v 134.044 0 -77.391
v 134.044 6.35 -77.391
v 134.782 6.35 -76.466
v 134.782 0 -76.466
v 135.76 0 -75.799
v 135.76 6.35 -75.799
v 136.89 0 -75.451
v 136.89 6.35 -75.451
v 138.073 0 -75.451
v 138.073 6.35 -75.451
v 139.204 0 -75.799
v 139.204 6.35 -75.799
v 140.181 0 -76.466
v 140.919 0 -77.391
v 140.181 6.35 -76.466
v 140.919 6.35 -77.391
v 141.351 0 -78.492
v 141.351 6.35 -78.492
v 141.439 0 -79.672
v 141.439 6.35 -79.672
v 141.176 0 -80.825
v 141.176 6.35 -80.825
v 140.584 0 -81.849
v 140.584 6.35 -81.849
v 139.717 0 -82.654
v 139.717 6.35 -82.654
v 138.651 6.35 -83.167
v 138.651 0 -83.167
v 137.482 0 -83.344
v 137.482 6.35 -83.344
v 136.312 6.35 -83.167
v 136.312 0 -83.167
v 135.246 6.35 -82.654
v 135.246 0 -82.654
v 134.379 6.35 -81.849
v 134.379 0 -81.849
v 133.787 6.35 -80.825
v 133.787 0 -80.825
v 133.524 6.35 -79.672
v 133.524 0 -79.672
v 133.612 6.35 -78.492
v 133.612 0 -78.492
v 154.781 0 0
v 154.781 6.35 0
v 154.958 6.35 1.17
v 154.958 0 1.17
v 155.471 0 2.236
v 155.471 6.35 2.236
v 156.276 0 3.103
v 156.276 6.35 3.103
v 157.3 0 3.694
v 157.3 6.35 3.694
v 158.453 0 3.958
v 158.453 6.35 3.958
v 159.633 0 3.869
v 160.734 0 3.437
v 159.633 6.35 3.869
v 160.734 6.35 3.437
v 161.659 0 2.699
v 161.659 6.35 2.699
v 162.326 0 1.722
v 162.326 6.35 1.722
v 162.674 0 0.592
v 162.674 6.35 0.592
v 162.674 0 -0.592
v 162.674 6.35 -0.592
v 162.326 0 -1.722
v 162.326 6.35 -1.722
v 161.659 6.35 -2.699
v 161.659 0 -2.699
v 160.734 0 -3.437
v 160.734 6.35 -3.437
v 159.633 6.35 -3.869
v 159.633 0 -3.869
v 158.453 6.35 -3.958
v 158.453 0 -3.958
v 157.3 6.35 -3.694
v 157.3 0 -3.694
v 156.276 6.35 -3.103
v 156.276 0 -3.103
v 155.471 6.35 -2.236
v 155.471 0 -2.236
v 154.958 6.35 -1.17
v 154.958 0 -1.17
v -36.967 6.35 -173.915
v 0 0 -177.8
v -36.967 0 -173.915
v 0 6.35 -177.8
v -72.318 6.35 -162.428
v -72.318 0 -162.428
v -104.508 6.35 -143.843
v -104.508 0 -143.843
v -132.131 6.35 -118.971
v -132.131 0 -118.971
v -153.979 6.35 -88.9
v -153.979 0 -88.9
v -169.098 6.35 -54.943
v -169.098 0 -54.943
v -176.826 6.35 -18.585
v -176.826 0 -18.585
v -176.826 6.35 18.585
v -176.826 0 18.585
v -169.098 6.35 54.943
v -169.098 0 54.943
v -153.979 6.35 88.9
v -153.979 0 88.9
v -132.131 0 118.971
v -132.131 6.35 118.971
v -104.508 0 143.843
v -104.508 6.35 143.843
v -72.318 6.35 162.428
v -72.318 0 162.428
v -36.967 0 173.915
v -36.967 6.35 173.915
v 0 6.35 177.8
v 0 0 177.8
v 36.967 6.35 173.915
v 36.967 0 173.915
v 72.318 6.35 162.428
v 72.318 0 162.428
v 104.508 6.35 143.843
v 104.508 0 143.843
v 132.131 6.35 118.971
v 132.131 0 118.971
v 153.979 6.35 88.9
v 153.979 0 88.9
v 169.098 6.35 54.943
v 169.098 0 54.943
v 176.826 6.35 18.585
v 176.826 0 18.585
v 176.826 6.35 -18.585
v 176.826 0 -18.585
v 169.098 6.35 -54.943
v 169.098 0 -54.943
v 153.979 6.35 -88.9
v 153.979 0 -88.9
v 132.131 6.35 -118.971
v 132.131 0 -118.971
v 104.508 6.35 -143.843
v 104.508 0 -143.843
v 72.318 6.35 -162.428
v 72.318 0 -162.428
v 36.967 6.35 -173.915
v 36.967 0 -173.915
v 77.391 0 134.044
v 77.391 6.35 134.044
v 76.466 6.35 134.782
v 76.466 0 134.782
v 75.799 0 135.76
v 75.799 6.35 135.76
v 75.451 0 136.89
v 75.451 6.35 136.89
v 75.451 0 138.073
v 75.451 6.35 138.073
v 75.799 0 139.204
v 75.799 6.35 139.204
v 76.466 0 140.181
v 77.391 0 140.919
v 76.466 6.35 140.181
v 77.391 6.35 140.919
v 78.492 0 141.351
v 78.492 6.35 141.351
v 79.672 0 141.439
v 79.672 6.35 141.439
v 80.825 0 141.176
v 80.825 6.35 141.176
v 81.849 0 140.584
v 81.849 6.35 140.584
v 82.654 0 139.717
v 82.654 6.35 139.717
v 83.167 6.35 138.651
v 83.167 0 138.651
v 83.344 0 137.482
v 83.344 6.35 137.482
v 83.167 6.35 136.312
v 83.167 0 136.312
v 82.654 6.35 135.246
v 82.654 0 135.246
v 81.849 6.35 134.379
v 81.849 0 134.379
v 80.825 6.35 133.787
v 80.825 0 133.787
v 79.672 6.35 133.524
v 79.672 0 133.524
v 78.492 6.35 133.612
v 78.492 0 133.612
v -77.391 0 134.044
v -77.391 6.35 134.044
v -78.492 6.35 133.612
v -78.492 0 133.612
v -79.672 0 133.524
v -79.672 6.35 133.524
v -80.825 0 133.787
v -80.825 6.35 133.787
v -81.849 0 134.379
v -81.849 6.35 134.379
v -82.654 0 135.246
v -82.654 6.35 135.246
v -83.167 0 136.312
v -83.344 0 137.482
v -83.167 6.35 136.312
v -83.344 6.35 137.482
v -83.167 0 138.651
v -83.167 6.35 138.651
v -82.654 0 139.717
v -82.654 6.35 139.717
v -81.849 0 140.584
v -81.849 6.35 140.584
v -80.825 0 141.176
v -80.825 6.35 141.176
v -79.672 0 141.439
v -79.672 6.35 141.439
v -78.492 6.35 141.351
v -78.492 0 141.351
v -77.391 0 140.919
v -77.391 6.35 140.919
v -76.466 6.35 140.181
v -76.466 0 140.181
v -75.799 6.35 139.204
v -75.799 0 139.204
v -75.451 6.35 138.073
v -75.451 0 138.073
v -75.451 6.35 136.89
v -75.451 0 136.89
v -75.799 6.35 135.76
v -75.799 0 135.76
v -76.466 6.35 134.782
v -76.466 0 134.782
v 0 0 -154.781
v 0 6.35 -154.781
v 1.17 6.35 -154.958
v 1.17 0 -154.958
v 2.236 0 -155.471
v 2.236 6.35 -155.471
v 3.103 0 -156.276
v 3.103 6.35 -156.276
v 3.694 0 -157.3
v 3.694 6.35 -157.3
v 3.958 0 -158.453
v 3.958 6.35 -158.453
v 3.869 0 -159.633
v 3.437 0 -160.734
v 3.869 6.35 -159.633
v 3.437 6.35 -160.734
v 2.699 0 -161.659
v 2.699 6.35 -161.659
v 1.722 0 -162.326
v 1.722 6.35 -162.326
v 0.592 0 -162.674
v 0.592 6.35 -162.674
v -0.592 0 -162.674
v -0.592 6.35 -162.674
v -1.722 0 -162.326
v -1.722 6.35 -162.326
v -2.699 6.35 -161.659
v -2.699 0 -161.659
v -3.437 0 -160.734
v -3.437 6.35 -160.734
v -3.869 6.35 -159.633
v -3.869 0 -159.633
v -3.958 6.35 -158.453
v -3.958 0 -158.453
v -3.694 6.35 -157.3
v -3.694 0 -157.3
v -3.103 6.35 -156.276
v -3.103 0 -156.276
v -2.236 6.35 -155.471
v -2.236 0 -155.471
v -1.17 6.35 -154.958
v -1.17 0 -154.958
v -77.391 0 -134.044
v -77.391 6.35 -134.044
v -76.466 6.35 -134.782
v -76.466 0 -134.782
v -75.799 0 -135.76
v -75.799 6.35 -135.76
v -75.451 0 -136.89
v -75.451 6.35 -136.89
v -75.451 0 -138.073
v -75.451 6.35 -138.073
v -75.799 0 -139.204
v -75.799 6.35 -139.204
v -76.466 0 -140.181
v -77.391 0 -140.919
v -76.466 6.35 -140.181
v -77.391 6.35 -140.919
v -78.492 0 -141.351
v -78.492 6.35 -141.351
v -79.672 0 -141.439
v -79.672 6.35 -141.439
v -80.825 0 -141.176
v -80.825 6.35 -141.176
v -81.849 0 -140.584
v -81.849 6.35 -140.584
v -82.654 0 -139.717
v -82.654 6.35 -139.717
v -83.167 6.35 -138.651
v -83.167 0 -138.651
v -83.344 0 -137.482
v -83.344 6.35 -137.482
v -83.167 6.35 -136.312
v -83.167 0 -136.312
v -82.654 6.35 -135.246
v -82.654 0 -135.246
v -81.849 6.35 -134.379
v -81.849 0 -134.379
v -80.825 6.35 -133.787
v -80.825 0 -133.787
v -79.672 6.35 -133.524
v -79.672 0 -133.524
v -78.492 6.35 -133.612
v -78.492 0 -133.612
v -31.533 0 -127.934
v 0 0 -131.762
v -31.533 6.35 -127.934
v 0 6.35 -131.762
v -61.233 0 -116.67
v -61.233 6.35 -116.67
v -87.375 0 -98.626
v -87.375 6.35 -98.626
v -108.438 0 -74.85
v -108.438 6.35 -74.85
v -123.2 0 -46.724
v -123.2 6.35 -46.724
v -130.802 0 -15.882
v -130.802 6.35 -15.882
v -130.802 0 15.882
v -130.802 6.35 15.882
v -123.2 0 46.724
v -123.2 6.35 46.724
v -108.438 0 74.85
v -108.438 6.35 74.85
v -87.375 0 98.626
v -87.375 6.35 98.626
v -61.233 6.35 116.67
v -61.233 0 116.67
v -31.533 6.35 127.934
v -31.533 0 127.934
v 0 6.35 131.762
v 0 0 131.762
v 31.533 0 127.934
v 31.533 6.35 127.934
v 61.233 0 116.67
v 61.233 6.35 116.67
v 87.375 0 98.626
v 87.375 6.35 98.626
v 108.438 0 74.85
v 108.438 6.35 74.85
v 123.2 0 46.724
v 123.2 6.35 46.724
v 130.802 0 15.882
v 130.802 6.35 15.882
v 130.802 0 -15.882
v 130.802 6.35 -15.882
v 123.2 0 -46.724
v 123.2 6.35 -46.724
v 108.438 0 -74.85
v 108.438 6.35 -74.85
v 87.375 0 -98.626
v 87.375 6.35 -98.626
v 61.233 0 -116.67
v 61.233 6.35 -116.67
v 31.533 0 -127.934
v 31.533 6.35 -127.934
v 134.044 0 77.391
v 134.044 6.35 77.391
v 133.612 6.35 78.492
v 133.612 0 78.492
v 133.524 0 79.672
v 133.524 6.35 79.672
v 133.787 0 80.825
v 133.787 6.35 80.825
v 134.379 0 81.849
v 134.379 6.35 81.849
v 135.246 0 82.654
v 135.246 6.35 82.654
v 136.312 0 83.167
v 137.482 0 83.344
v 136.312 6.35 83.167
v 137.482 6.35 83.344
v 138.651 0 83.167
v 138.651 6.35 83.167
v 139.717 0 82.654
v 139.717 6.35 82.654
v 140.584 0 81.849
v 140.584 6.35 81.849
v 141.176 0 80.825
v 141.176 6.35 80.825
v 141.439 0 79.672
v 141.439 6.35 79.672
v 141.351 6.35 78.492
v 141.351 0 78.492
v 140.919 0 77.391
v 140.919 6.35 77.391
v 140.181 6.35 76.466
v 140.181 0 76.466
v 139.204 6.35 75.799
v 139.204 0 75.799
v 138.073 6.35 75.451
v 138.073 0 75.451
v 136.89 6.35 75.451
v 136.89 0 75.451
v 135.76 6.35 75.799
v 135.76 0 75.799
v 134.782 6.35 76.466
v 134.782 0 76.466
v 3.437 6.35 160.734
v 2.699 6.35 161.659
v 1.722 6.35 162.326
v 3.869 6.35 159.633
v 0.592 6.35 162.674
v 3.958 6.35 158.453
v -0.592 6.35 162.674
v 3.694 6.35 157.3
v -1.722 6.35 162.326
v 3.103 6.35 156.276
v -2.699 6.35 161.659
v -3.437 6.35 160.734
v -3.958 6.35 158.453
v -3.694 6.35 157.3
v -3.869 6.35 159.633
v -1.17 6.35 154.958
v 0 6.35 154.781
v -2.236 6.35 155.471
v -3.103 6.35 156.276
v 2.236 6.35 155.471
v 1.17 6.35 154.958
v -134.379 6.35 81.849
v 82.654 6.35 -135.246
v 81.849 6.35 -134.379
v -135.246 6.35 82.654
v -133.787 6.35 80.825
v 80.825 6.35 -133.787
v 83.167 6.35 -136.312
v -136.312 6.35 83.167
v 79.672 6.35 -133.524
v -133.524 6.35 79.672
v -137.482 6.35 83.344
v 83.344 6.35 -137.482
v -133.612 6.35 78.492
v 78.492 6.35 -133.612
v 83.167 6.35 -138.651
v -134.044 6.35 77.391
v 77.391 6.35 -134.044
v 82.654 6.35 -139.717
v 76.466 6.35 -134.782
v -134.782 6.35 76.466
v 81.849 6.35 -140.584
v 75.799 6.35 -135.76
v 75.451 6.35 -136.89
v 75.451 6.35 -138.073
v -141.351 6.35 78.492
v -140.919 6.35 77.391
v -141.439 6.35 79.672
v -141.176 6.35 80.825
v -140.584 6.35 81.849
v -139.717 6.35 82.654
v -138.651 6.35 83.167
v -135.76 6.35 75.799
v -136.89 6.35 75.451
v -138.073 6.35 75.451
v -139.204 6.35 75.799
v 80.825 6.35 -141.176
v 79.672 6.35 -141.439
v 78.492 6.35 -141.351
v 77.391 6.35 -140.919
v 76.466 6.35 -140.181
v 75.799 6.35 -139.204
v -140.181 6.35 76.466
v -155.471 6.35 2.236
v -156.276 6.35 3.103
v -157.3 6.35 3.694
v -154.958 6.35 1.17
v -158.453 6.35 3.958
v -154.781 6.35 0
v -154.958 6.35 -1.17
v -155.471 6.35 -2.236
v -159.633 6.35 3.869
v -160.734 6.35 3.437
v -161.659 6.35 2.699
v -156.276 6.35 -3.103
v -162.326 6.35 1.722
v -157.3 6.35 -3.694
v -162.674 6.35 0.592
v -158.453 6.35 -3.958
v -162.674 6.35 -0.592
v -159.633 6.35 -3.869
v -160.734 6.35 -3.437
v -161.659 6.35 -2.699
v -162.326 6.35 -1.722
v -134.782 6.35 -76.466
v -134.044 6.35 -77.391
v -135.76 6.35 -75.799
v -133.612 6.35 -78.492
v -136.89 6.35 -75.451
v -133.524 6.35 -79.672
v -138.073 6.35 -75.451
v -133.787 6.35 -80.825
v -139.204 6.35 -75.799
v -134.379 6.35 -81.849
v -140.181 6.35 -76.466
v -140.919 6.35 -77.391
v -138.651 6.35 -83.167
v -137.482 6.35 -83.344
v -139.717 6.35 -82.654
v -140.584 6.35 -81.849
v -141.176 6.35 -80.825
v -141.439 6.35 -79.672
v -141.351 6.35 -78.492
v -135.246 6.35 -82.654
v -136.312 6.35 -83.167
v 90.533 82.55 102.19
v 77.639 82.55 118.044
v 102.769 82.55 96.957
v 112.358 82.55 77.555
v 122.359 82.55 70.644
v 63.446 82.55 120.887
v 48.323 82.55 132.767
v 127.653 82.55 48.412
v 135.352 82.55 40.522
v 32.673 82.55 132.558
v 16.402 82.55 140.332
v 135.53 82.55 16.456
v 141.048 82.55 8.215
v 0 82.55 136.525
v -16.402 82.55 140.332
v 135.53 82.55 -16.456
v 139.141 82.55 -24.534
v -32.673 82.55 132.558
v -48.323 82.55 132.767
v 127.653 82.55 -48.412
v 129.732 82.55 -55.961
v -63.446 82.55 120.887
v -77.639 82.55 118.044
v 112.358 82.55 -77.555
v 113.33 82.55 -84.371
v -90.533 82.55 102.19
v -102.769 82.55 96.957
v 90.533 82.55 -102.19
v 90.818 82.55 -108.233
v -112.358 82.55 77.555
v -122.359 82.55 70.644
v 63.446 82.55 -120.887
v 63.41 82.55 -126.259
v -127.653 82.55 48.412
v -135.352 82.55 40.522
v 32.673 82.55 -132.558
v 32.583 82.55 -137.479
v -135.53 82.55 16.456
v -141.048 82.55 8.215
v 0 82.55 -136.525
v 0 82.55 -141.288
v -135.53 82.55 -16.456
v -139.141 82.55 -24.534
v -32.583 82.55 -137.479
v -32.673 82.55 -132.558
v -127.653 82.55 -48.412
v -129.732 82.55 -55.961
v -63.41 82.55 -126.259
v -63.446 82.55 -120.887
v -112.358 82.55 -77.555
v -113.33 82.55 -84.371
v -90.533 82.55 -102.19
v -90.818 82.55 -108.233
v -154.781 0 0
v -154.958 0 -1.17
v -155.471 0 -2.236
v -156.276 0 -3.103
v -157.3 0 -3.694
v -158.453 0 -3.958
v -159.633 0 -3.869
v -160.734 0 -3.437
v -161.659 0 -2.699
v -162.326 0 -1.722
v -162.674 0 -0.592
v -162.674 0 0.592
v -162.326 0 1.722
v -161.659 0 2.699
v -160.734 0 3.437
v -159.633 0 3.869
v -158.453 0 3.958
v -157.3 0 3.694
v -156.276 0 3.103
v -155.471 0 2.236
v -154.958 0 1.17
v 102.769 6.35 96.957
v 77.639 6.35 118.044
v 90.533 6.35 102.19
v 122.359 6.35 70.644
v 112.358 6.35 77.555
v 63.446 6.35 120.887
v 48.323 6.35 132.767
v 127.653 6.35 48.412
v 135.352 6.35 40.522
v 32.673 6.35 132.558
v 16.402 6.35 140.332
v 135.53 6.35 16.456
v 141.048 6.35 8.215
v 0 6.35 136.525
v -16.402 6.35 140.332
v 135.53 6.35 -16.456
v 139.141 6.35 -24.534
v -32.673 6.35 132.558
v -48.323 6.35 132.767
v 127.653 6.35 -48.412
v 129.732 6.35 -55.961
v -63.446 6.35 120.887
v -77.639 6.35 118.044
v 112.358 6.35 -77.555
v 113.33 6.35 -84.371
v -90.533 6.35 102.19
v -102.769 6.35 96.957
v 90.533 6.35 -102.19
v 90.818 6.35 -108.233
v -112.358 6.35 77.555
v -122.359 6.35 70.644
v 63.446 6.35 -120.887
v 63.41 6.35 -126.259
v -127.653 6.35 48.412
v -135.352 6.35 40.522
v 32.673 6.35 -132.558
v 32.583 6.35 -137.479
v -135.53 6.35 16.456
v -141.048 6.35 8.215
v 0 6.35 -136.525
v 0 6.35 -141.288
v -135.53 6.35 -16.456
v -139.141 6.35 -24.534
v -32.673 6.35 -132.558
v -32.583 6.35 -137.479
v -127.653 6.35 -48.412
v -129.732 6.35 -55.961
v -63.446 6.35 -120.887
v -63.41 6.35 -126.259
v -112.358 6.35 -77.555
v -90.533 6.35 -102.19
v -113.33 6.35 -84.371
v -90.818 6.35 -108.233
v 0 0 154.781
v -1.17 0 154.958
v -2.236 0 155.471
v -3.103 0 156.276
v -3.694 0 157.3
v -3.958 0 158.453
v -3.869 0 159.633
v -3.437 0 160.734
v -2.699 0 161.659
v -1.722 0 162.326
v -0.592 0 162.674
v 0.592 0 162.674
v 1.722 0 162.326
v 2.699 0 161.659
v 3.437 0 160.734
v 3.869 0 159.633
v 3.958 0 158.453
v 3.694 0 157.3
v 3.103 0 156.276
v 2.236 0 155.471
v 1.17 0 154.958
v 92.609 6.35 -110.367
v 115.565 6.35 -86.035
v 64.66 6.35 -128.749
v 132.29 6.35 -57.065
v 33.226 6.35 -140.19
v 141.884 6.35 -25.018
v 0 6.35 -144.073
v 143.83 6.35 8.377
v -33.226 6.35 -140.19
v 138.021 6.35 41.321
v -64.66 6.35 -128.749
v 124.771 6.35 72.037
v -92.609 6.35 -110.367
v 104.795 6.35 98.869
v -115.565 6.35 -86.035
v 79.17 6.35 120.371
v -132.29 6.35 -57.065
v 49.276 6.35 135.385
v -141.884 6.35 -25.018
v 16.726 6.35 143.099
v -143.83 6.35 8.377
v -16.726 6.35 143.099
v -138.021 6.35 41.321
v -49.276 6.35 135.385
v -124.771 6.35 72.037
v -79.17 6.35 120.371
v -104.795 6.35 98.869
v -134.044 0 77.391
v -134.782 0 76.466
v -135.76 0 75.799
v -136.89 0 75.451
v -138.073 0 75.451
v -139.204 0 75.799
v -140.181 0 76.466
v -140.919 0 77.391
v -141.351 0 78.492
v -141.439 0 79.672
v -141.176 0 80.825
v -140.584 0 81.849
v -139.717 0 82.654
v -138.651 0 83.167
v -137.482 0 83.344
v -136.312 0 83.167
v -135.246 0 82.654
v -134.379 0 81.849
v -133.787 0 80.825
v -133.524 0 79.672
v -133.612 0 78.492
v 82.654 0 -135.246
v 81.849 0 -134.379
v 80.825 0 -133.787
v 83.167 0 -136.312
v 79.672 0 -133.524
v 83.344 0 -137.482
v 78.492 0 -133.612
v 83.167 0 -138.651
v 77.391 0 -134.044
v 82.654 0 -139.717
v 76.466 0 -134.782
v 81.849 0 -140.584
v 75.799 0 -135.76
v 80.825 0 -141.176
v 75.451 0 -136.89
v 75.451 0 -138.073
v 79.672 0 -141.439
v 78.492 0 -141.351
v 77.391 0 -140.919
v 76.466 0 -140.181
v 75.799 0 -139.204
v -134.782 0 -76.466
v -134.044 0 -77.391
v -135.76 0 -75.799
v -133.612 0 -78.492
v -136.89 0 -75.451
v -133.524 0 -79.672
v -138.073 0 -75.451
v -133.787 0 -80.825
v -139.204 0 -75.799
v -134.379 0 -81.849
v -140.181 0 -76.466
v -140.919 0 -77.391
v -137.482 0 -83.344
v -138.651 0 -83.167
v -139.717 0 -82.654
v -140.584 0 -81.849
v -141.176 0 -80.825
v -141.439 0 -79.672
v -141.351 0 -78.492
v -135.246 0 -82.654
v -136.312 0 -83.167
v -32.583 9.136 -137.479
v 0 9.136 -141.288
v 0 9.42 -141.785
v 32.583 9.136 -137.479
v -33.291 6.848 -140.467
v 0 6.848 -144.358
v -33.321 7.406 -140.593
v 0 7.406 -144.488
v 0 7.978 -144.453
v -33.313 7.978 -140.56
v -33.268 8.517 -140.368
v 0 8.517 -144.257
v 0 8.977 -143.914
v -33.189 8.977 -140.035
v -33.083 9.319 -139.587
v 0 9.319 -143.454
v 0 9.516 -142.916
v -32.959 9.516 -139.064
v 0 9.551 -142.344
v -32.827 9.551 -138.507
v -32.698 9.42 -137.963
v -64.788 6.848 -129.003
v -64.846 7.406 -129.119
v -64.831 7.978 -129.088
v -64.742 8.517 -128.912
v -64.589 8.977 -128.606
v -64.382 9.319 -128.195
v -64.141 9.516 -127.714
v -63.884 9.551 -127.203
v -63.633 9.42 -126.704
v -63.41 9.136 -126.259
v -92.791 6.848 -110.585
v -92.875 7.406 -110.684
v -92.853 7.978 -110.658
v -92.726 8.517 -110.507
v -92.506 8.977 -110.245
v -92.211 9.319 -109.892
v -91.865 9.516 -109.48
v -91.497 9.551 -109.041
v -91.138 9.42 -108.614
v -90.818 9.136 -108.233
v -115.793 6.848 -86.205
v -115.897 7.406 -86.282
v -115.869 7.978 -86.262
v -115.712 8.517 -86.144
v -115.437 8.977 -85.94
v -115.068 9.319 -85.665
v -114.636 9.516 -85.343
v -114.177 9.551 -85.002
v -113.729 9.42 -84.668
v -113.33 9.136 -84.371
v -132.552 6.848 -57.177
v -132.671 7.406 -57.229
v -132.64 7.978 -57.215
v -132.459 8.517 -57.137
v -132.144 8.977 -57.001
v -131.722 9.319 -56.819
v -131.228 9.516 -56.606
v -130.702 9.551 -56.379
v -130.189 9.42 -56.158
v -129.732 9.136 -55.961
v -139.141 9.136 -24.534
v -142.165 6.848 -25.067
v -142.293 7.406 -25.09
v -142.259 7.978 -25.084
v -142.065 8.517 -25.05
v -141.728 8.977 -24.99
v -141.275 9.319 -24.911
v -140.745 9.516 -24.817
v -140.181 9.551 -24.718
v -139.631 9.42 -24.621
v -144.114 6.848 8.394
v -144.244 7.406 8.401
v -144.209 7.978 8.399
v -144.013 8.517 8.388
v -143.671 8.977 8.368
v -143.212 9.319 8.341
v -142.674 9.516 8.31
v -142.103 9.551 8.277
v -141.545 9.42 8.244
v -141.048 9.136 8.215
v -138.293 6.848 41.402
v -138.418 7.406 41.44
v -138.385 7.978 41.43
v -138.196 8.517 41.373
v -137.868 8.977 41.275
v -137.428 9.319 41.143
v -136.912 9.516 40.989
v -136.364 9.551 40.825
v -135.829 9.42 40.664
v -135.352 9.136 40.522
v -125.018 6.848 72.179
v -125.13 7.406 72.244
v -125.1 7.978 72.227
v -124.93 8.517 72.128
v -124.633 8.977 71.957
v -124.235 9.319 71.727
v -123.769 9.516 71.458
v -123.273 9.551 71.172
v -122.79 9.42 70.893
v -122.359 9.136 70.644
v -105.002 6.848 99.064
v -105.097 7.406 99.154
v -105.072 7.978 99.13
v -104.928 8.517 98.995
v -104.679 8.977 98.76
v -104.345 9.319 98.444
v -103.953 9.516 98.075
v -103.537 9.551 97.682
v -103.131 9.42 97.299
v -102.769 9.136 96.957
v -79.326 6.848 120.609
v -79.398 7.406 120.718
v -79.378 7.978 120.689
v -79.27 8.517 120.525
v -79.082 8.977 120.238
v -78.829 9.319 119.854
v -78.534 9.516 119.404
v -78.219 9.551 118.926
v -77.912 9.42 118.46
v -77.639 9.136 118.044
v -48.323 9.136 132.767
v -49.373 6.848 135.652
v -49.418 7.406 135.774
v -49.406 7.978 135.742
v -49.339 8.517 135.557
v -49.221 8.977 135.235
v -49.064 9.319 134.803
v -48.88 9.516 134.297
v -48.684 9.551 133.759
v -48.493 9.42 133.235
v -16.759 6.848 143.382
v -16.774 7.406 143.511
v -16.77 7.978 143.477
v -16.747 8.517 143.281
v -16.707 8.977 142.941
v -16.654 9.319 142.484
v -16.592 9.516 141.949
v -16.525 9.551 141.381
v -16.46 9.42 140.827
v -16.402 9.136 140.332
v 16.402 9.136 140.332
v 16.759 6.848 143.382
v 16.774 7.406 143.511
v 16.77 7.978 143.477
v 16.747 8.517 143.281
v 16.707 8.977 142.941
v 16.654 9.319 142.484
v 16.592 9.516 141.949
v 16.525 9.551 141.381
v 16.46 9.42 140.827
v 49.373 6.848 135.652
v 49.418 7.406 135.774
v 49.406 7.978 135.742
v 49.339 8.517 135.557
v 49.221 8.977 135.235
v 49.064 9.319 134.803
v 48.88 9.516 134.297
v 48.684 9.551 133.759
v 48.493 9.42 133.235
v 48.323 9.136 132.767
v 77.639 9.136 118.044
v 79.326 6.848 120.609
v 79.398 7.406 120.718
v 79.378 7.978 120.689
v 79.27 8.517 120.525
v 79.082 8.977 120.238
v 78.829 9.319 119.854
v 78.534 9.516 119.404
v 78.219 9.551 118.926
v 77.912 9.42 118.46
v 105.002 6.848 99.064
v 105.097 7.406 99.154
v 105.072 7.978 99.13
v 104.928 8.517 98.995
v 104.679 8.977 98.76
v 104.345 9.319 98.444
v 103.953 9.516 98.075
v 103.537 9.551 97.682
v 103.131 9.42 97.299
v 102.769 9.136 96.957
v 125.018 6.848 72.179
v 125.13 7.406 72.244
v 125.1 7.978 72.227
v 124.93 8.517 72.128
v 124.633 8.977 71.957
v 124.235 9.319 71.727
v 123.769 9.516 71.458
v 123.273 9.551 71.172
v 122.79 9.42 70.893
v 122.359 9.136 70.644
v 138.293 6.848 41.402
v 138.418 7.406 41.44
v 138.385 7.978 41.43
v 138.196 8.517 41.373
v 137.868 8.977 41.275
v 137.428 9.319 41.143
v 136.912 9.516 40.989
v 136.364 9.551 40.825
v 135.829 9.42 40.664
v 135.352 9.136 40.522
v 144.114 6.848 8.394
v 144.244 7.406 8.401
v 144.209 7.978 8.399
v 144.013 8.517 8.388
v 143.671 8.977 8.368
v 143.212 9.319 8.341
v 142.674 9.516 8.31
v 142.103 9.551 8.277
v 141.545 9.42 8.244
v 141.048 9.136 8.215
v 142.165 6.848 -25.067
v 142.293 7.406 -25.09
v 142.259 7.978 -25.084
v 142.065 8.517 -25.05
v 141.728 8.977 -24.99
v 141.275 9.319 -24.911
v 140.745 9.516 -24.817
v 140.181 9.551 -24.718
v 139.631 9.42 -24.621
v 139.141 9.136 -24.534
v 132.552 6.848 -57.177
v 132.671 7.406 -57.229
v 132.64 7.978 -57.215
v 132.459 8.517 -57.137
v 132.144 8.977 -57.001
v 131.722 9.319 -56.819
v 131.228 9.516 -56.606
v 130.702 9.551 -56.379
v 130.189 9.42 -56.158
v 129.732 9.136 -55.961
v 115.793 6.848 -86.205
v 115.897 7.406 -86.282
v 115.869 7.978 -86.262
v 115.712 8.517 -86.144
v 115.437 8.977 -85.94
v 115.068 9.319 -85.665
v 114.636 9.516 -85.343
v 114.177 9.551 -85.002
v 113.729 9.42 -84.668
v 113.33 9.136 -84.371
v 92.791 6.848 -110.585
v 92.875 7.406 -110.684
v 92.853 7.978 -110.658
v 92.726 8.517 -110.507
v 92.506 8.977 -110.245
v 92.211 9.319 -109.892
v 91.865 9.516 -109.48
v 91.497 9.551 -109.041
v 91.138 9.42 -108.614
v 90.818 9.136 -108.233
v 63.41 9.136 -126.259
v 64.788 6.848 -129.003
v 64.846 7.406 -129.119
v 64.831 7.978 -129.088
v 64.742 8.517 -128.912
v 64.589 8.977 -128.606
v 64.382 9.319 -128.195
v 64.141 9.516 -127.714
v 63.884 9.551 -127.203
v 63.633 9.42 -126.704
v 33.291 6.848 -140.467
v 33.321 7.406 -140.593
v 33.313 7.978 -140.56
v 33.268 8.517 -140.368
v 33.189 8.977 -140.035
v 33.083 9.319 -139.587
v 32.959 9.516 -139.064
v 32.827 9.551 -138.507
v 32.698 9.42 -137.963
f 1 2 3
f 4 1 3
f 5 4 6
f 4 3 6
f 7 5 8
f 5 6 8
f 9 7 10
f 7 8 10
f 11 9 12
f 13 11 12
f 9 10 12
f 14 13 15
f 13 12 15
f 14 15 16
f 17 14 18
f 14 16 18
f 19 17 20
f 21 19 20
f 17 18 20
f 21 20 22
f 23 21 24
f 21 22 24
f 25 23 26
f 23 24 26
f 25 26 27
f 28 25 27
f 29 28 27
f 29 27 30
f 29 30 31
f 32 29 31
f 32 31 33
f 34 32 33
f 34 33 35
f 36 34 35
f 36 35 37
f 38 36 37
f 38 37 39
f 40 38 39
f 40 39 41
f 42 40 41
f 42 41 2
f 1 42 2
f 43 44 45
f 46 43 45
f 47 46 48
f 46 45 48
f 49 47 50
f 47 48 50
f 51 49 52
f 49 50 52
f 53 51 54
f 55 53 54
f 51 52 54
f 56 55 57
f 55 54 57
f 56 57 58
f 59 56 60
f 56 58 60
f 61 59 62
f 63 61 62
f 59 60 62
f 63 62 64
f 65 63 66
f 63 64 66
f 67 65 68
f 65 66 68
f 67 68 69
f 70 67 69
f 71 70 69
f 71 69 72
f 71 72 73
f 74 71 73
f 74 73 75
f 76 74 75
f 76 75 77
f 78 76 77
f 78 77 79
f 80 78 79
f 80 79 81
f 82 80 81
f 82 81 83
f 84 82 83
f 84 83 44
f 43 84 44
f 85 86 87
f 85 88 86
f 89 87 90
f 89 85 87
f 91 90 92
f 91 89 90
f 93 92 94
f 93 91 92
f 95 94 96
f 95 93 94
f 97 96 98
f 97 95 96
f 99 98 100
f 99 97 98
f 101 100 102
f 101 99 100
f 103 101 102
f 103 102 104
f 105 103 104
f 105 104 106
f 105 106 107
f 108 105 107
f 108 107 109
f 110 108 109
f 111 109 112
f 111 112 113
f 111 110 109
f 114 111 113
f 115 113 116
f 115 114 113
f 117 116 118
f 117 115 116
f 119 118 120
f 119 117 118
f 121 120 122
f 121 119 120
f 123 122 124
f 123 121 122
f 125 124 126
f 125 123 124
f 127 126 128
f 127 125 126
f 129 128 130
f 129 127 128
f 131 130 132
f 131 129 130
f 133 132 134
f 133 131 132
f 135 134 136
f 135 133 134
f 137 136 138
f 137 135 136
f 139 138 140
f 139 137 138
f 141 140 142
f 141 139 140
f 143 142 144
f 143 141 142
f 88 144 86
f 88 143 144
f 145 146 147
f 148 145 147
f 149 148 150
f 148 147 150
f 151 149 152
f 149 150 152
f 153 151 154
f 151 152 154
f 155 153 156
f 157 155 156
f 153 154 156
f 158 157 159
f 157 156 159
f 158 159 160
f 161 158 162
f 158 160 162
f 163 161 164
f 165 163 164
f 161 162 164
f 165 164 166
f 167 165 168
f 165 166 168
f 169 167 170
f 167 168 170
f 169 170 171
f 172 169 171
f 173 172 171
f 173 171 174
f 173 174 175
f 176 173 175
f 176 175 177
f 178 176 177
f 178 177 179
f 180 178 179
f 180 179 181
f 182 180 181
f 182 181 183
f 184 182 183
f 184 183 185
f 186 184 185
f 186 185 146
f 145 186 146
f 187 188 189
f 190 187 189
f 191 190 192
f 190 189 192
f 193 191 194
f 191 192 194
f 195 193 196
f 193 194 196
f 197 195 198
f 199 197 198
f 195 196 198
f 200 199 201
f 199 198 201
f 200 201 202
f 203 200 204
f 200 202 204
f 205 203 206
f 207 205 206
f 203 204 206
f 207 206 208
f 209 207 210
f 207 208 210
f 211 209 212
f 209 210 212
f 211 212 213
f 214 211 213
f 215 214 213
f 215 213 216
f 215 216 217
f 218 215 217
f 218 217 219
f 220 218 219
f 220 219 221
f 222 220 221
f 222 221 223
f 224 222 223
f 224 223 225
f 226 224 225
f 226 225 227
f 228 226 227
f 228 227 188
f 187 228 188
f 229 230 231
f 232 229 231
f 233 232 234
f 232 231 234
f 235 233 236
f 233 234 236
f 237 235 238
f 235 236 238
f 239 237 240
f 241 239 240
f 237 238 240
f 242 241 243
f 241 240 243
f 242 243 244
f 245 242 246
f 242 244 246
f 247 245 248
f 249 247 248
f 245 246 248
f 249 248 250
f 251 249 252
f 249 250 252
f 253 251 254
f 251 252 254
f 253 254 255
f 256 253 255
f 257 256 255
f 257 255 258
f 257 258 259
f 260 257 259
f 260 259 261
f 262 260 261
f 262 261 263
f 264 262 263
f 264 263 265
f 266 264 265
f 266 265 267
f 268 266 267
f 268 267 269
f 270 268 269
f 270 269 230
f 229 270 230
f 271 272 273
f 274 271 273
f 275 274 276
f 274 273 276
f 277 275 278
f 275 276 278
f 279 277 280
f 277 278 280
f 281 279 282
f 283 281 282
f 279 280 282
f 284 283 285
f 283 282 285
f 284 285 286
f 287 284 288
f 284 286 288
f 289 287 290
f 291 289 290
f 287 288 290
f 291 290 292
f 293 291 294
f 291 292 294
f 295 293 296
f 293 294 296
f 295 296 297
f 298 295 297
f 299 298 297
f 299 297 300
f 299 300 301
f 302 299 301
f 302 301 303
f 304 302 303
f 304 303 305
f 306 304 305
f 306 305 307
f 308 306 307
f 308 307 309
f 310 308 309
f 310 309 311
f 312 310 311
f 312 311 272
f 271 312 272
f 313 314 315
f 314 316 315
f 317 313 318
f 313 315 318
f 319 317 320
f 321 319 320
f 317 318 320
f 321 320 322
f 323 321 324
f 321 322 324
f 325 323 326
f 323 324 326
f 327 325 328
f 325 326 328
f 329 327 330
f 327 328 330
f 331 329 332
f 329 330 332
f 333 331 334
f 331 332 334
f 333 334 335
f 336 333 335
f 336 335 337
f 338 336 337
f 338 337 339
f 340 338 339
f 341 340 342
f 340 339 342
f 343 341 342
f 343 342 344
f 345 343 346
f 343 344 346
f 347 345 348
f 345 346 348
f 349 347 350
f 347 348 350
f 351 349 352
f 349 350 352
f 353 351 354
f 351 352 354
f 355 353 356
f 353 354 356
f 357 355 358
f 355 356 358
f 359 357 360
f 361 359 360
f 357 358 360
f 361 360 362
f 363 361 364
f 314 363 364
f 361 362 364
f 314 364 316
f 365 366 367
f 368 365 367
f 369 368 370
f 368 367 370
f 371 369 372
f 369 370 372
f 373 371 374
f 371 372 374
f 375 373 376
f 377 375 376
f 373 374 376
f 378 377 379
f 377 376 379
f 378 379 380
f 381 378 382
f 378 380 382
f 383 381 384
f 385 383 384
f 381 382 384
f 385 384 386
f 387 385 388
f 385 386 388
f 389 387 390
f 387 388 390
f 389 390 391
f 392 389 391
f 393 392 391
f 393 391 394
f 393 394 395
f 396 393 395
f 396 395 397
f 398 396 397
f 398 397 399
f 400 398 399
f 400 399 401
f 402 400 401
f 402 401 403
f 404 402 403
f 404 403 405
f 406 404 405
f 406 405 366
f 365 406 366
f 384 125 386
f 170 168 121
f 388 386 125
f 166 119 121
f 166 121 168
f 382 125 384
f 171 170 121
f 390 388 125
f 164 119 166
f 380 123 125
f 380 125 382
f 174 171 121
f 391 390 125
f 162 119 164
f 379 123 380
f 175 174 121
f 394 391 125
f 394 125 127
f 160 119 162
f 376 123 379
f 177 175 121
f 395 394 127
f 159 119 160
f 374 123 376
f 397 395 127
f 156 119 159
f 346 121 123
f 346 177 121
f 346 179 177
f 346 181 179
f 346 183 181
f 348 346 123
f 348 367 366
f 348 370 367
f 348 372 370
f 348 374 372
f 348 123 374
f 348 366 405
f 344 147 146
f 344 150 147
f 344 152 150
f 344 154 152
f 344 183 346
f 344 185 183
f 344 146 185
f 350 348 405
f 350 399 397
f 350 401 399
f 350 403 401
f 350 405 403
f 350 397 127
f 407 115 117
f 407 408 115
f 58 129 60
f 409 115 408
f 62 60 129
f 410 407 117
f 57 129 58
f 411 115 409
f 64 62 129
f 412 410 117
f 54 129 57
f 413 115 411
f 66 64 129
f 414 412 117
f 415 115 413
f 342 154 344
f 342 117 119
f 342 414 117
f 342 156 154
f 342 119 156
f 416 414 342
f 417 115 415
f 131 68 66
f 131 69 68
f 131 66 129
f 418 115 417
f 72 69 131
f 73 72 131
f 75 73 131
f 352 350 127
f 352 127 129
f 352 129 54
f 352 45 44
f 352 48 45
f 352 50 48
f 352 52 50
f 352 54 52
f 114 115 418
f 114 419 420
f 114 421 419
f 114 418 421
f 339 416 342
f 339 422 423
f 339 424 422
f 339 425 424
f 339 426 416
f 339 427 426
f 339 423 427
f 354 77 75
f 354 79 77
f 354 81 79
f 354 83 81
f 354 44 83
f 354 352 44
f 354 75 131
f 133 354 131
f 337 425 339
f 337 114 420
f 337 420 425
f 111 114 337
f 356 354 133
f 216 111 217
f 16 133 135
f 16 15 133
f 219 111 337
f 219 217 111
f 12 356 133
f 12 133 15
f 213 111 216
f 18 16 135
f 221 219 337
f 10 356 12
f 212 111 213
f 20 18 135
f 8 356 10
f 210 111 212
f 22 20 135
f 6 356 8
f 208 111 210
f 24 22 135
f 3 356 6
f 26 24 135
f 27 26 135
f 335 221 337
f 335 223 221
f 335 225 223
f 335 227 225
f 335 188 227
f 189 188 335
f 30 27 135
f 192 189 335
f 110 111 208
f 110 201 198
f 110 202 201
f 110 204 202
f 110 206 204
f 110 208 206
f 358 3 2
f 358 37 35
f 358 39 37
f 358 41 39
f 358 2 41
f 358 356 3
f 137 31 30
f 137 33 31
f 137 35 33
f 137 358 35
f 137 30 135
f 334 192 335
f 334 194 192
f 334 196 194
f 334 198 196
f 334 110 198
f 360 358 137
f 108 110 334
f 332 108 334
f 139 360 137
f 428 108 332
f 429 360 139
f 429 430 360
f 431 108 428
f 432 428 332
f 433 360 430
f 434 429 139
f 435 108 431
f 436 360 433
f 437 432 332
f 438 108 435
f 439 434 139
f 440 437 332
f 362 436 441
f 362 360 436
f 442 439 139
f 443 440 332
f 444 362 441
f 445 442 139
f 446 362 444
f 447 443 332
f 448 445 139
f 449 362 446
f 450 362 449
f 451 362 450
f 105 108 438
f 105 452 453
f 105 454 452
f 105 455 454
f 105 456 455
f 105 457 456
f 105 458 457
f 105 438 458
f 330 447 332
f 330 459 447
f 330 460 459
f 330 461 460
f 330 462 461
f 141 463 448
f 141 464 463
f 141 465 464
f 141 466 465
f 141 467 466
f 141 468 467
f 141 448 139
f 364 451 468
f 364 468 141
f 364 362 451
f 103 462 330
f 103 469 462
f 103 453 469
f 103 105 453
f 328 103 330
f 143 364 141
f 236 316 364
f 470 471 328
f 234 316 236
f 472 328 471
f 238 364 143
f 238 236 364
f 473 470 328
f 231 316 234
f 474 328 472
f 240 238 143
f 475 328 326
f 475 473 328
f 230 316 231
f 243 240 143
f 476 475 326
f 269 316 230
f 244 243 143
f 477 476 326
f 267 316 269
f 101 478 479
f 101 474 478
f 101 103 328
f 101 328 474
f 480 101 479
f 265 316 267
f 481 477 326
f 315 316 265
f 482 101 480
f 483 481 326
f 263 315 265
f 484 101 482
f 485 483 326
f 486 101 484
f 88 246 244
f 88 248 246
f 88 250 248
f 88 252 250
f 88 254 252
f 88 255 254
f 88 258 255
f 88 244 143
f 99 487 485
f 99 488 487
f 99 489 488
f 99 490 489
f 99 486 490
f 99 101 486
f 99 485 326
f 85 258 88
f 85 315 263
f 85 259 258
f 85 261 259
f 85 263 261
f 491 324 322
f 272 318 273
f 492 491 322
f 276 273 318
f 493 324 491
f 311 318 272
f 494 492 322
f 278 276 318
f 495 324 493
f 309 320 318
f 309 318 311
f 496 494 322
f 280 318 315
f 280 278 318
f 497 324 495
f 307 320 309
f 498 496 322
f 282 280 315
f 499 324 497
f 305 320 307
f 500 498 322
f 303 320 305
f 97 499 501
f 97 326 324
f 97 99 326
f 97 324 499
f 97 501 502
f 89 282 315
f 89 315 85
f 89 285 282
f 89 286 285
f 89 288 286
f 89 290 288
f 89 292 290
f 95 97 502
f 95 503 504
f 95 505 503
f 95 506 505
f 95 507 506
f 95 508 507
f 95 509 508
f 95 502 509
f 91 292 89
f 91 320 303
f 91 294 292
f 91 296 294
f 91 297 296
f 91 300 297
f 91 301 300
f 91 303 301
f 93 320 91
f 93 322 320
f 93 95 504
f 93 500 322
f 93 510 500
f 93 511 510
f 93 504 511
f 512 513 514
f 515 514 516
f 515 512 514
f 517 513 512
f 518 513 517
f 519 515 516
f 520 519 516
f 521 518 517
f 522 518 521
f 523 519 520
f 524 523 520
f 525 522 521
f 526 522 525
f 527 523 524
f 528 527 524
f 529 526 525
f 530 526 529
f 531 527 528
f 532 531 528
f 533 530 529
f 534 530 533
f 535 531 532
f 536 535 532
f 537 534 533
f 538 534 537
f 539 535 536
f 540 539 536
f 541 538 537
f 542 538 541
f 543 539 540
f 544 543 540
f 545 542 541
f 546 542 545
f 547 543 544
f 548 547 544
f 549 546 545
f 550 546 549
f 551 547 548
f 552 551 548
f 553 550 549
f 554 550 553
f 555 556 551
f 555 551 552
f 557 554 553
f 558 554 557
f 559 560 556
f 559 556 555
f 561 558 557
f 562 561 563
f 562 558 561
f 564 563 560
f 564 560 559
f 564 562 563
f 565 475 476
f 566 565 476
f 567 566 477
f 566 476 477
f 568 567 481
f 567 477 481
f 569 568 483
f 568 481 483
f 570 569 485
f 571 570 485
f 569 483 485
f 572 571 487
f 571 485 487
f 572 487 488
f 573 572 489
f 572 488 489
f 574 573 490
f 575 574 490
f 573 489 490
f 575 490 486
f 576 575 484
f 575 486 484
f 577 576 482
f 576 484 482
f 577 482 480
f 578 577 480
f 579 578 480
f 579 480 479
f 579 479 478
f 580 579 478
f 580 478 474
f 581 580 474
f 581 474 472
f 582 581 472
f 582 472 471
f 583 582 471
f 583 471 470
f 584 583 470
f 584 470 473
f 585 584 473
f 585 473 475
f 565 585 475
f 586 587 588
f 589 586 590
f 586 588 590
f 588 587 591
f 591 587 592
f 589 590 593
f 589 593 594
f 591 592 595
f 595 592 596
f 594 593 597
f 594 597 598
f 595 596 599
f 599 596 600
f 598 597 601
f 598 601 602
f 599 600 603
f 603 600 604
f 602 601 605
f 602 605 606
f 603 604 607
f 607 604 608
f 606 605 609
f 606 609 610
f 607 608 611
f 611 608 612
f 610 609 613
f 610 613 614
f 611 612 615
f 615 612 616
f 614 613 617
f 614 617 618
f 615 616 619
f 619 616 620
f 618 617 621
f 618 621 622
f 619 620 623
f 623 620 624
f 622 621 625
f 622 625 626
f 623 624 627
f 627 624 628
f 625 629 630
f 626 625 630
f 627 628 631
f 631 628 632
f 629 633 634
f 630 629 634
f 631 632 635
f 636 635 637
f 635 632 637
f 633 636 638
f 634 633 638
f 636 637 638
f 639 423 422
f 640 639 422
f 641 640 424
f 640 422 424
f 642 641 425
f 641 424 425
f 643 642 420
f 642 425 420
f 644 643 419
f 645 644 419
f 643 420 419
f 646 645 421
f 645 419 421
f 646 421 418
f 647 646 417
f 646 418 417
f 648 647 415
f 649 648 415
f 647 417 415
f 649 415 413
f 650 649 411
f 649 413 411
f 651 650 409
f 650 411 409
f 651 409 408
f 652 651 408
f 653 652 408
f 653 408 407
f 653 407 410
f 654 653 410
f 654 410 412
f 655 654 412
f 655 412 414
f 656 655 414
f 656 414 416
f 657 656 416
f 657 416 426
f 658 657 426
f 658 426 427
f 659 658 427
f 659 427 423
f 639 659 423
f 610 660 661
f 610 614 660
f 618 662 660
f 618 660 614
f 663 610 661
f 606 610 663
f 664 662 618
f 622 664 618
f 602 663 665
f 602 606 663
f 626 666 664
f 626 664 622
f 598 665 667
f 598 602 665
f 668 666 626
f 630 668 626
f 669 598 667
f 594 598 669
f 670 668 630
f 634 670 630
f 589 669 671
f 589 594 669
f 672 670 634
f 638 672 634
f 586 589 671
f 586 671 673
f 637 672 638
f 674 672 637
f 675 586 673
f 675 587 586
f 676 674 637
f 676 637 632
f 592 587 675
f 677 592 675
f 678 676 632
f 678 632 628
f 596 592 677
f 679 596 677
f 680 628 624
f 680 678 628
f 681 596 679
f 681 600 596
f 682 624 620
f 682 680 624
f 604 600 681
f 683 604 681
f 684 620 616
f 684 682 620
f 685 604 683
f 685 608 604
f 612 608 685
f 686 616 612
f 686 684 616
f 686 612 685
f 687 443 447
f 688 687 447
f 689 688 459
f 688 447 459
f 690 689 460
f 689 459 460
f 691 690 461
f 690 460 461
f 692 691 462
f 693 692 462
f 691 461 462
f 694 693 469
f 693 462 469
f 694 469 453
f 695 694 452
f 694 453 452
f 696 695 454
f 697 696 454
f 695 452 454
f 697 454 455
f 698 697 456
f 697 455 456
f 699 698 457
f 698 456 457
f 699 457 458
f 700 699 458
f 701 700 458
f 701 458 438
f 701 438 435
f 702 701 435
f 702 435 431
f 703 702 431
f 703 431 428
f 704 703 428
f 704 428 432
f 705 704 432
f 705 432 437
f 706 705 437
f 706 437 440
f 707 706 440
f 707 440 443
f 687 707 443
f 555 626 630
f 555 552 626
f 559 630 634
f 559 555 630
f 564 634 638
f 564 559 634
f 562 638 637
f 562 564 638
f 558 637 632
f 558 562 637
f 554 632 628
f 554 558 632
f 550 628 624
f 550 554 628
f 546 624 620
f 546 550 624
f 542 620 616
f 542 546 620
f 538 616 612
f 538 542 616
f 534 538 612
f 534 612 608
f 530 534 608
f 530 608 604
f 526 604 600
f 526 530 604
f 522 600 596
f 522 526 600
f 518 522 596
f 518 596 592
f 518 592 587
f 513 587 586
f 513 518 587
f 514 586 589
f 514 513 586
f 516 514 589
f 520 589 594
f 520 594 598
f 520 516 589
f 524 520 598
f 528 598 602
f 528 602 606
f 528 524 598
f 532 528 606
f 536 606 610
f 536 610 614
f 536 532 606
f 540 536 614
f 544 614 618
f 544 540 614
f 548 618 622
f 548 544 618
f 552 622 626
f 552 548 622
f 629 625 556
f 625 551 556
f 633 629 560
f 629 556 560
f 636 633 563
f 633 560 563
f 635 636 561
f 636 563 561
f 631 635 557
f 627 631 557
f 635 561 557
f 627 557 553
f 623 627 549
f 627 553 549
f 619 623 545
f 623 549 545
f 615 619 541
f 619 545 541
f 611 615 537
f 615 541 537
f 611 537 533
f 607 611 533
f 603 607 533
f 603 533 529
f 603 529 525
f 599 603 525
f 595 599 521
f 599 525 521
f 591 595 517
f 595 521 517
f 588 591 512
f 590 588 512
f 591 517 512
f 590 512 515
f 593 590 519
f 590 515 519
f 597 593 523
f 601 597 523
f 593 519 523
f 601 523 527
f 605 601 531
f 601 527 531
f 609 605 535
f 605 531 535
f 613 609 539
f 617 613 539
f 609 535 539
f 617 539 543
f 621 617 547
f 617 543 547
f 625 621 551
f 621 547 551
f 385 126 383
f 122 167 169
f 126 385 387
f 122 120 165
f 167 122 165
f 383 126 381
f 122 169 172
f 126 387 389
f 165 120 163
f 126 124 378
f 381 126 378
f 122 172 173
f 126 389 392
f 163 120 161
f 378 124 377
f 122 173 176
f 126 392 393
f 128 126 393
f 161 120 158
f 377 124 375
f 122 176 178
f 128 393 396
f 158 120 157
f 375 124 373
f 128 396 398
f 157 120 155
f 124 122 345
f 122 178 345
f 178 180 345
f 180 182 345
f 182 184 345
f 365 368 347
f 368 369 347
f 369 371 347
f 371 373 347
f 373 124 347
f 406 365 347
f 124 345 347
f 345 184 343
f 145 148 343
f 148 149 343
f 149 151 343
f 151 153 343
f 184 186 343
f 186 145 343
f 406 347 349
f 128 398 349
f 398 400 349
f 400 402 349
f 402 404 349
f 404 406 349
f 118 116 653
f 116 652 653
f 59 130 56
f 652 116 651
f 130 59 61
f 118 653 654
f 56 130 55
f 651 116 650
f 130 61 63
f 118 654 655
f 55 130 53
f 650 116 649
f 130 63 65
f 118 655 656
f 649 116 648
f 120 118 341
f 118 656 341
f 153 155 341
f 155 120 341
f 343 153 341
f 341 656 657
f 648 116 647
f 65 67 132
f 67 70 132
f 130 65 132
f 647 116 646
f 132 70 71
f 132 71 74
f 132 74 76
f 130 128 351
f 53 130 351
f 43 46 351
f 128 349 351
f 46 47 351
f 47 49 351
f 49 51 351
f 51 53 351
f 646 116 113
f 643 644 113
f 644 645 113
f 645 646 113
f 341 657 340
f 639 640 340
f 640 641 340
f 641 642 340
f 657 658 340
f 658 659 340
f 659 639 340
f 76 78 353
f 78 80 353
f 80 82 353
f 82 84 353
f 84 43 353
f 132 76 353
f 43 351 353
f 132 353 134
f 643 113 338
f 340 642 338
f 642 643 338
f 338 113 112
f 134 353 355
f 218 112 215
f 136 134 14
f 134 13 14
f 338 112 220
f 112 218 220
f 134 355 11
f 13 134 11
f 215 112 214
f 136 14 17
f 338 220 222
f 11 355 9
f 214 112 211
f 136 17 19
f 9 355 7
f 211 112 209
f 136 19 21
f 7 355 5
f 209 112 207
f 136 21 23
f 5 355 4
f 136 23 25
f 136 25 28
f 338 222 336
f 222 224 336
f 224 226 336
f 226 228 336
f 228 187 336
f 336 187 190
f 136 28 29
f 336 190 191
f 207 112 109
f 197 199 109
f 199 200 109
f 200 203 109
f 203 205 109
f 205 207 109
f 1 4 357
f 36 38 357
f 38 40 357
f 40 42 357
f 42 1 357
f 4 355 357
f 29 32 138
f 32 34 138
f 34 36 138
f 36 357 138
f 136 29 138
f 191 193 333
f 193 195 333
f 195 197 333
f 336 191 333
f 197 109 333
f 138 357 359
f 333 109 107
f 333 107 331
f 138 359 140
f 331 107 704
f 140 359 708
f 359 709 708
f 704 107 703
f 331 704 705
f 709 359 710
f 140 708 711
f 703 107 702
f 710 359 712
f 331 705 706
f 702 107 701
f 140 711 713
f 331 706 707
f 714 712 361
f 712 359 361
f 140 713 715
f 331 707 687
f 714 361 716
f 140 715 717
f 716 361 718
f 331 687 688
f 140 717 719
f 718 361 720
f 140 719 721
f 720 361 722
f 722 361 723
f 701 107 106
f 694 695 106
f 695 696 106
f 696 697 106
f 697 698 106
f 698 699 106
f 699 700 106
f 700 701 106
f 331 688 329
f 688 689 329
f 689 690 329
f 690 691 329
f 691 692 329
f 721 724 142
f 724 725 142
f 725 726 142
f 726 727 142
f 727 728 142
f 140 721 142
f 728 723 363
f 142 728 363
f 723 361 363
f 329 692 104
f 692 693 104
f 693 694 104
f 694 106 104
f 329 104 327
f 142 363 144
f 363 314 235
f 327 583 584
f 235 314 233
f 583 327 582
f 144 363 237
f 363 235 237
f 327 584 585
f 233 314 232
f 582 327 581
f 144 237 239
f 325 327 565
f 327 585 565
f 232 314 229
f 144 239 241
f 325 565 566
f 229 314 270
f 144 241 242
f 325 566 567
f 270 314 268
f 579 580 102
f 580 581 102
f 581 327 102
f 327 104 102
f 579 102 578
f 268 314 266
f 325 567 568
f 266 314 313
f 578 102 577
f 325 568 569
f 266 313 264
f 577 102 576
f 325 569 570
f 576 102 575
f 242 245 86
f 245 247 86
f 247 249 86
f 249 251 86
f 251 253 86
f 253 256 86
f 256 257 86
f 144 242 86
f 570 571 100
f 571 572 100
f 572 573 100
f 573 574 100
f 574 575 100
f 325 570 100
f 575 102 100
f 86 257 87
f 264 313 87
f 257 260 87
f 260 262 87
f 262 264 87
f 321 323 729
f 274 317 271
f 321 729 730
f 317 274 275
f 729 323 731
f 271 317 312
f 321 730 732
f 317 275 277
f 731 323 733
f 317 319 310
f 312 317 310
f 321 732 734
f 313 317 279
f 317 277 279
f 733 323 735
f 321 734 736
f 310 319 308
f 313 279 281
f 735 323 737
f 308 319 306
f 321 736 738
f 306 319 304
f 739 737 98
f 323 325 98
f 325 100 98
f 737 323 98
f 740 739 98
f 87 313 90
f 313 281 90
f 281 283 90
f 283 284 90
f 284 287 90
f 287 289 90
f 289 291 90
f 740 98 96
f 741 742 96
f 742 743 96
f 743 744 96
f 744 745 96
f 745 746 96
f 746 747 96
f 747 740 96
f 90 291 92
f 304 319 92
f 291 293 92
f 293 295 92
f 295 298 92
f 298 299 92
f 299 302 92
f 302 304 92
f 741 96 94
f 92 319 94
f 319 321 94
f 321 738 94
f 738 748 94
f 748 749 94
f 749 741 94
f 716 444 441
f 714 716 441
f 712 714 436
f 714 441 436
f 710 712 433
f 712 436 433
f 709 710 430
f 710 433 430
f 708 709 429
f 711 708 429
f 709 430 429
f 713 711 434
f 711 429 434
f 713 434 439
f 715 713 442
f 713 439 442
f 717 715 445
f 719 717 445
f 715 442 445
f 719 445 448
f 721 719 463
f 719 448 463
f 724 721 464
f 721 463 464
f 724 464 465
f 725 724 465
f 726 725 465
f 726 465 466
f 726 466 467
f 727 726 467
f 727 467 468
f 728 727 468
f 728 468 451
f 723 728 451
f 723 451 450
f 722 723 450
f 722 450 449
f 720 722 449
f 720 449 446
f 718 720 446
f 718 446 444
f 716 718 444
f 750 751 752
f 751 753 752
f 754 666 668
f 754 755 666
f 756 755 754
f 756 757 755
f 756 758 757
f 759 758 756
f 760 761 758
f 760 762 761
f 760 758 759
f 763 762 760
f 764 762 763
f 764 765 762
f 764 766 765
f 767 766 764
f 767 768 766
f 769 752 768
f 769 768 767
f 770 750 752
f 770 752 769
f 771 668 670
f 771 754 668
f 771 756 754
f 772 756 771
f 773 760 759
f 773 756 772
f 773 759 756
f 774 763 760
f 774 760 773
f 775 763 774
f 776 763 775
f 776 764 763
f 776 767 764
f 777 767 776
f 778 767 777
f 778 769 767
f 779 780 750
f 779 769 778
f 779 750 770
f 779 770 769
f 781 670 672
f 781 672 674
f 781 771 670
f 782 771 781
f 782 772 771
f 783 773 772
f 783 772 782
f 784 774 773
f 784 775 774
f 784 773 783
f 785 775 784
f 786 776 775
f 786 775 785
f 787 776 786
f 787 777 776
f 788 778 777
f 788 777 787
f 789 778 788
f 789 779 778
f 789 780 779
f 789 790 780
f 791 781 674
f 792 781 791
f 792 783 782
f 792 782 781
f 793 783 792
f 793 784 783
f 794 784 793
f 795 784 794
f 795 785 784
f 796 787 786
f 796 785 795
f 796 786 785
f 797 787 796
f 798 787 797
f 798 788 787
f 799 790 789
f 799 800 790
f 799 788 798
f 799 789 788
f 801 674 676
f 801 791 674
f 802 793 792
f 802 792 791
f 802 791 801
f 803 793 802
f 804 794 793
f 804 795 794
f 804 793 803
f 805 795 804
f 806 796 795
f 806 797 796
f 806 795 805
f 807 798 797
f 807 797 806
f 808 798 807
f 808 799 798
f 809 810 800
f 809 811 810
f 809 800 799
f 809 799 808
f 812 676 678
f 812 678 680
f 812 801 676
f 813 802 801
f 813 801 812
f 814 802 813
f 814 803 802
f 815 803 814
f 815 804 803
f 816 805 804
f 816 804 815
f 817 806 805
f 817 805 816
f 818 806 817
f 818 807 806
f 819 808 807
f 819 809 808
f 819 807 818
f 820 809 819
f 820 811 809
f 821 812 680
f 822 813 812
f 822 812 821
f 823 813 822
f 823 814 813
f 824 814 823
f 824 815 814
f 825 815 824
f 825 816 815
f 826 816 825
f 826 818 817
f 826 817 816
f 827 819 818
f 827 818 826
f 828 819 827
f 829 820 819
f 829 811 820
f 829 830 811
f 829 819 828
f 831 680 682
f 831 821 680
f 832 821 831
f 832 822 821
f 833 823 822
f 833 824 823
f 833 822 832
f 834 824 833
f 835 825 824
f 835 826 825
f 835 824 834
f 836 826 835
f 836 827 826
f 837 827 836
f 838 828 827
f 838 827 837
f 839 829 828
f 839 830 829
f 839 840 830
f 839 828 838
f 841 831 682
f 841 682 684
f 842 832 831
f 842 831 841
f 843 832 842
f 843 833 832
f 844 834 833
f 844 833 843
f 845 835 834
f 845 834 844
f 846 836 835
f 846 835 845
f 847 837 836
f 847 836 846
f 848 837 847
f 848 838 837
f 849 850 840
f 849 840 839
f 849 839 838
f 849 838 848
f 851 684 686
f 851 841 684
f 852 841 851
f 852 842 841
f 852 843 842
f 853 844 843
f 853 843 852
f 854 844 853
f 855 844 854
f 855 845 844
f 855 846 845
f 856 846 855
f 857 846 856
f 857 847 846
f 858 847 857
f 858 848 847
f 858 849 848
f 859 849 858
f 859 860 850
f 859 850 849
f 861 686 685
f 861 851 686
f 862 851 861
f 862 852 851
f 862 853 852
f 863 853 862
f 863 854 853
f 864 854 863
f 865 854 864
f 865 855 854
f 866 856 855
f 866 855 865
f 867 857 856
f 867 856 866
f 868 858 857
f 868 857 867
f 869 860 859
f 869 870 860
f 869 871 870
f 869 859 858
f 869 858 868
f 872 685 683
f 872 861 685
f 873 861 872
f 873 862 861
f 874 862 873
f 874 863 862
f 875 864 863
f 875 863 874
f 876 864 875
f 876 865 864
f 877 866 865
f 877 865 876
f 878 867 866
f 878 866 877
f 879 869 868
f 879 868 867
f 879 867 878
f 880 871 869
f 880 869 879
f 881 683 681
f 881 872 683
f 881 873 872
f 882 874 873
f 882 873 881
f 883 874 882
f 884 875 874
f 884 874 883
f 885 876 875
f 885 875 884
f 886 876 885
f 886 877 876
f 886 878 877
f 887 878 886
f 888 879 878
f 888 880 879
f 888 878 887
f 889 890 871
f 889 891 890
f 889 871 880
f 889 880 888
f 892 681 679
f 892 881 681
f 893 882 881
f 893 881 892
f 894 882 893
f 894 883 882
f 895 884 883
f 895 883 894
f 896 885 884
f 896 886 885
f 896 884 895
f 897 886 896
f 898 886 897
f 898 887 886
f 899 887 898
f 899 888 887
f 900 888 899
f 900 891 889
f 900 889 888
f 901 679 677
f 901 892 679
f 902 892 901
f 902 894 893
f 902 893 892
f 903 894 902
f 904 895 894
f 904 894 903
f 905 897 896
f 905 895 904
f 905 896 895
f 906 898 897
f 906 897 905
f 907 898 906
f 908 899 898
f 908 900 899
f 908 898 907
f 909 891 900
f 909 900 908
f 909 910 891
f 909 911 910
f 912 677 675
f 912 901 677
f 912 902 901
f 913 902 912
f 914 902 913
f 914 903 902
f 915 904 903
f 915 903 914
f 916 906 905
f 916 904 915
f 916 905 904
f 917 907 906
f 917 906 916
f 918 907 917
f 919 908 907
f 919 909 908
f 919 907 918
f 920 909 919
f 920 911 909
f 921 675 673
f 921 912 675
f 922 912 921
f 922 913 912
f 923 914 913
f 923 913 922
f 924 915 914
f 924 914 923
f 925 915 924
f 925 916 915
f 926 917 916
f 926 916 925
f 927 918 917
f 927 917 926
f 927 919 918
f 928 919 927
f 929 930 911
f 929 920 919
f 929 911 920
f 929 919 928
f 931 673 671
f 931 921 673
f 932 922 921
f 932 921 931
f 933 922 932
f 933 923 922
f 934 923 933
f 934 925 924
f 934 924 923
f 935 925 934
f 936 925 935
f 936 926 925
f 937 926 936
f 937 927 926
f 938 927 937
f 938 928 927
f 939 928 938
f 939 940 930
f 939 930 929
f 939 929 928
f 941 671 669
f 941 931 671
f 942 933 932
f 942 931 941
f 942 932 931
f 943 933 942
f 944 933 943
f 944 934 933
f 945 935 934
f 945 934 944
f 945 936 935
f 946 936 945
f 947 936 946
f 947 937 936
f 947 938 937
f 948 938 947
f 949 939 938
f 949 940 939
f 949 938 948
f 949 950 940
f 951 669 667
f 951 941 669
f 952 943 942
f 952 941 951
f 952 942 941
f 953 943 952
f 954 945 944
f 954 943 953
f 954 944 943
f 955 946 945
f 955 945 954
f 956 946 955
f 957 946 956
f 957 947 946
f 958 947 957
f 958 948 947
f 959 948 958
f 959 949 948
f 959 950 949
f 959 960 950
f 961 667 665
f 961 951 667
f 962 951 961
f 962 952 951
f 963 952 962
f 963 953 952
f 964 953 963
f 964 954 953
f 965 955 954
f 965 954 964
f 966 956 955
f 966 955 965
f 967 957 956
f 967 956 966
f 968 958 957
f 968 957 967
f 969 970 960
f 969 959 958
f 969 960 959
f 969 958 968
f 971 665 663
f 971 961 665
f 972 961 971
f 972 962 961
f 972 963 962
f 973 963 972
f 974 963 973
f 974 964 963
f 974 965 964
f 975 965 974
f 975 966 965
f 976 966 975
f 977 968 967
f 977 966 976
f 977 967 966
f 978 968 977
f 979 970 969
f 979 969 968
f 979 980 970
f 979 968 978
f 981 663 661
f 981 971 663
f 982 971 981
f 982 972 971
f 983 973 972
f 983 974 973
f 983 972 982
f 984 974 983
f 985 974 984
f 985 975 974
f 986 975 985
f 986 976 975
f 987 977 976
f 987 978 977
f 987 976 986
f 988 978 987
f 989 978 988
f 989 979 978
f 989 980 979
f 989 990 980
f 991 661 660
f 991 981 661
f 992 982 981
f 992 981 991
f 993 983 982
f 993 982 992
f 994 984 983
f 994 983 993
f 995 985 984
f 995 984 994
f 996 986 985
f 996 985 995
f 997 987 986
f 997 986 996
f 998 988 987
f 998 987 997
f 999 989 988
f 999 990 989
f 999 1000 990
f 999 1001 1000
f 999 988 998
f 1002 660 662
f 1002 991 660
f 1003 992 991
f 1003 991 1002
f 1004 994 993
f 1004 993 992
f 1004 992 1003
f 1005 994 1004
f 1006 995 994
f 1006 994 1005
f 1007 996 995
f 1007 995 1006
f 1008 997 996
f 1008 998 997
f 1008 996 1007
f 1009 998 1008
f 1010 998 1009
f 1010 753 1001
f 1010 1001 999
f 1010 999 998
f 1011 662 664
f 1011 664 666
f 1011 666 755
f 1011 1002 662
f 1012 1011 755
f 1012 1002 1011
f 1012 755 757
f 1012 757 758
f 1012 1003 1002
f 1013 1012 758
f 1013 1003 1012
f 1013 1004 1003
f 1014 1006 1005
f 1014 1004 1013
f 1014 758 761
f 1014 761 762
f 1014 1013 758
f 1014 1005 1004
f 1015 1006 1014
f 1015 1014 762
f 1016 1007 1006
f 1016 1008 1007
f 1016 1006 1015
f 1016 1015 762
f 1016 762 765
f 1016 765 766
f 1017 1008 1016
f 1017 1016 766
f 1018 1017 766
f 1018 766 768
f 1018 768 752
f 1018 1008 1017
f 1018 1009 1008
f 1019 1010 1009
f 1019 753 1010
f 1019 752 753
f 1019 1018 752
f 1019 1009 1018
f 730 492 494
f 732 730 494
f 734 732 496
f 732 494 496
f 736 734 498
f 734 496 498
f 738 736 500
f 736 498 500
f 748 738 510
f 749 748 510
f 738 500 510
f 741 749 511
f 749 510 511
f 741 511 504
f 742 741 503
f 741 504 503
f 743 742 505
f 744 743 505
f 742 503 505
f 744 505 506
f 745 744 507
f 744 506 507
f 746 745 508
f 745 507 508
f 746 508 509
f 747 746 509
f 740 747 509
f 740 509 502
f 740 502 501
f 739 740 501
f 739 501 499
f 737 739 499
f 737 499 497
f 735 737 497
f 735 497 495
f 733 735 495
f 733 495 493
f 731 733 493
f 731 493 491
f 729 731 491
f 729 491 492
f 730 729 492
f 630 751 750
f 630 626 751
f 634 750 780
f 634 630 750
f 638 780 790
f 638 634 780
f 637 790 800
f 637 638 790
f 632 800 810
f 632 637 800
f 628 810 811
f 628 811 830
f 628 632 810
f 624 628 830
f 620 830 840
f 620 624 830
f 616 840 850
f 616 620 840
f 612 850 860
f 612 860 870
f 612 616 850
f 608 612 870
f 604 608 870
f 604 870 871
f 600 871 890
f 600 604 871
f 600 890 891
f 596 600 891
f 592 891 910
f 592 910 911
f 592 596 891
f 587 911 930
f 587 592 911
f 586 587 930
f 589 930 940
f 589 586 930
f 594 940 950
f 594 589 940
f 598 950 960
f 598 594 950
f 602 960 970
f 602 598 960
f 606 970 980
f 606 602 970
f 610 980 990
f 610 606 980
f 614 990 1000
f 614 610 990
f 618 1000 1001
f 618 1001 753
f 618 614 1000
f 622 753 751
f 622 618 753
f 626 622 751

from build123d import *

# Parameters (mm, degrees)
SKETCH1_W          = 46.0375
SKETCH1_H          = 6.35
SKETCH2_W          = 4.7625
SKETCH2_H          = 76.2
SKETCH4_R          = 3.96875
CUT_EXTRUDE1_DEPTH = 7.35
CIRPATTERN1_COUNT  = 12


with BuildPart() as part:
    # Sketch1 → Revolve1 (revolve)
    with BuildSketch(Plane.XY, mode=Mode.PRIVATE) as revolve1_sk:
        with Locations((-154.78125, 3.175)):
            Rectangle(SKETCH1_W, SKETCH1_H)
    revolve(revolve1_sk.sketch.rotate(Axis((0, 0, 0), (0, 1, 0)), 270), axis=Axis((0, 0, 0), (0, 1, 0)))  # turned: the seam where the file's is

    # Sketch4 → Cut-Extrude1 (cut, through all)
    with BuildSketch(Plane(origin=(0, 6.35, 0), x_dir=(1, 0, 0), z_dir=(0, 1, 0))):
        with Locations(Location((0, 158.75, 0), (0, 0, 270))):  # turned: the seam where the file's is
            Circle(SKETCH4_R)
    cut_extrude1 = extrude(amount=-CUT_EXTRUDE1_DEPTH, mode=Mode.SUBTRACT)

    # CirPattern1: Cut-Extrude1 ×12 about axis
    cirpattern1_axis = Axis((0, 0, 0), (0, 1, 0))
    for i in range(1, CIRPATTERN1_COUNT):
        add(cut_extrude1.rotate(cirpattern1_axis, i * 360 / CIRPATTERN1_COUNT), mode=Mode.SUBTRACT)


with BuildPart() as body_2:
    # Sketch2 → Revolve2 (revolve)
    with BuildSketch(Plane.XY, mode=Mode.PRIVATE) as revolve2_sk:
        with Locations((-138.90625, 44.45)):
            Rectangle(SKETCH2_W, SKETCH2_H)
    revolve(revolve2_sk.sketch.rotate(Axis((0, 0, 0), (0, 1, 0)), 270), axis=Axis((0, 0, 0), (0, 1, 0)))  # turned: the seam where the file's is


with BuildPart() as body_3:
    # Sketch3 → Revolve3 (revolve)
    with BuildSketch(Plane.XY, mode=Mode.PRIVATE) as revolve3_sk:
        with BuildLine():
            Line((-141.2875, 6.35), (-144.073275819, 6.35))
            ThreePointArc((-144.073275819, 6.35), (-143.914037909, 8.976537909), (-141.2875, 9.135775819))
            Line((-141.2875, 9.135775819), (-141.2875, 6.35))
        make_face()
    revolve(revolve3_sk.sketch.rotate(Axis((0, 0, 0), (0, 1, 0)), 270), axis=Axis((0, 0, 0), (0, 1, 0)))  # turned: the seam where the file's is


solid = Compound([part.part, body_2.part, body_3.part])
